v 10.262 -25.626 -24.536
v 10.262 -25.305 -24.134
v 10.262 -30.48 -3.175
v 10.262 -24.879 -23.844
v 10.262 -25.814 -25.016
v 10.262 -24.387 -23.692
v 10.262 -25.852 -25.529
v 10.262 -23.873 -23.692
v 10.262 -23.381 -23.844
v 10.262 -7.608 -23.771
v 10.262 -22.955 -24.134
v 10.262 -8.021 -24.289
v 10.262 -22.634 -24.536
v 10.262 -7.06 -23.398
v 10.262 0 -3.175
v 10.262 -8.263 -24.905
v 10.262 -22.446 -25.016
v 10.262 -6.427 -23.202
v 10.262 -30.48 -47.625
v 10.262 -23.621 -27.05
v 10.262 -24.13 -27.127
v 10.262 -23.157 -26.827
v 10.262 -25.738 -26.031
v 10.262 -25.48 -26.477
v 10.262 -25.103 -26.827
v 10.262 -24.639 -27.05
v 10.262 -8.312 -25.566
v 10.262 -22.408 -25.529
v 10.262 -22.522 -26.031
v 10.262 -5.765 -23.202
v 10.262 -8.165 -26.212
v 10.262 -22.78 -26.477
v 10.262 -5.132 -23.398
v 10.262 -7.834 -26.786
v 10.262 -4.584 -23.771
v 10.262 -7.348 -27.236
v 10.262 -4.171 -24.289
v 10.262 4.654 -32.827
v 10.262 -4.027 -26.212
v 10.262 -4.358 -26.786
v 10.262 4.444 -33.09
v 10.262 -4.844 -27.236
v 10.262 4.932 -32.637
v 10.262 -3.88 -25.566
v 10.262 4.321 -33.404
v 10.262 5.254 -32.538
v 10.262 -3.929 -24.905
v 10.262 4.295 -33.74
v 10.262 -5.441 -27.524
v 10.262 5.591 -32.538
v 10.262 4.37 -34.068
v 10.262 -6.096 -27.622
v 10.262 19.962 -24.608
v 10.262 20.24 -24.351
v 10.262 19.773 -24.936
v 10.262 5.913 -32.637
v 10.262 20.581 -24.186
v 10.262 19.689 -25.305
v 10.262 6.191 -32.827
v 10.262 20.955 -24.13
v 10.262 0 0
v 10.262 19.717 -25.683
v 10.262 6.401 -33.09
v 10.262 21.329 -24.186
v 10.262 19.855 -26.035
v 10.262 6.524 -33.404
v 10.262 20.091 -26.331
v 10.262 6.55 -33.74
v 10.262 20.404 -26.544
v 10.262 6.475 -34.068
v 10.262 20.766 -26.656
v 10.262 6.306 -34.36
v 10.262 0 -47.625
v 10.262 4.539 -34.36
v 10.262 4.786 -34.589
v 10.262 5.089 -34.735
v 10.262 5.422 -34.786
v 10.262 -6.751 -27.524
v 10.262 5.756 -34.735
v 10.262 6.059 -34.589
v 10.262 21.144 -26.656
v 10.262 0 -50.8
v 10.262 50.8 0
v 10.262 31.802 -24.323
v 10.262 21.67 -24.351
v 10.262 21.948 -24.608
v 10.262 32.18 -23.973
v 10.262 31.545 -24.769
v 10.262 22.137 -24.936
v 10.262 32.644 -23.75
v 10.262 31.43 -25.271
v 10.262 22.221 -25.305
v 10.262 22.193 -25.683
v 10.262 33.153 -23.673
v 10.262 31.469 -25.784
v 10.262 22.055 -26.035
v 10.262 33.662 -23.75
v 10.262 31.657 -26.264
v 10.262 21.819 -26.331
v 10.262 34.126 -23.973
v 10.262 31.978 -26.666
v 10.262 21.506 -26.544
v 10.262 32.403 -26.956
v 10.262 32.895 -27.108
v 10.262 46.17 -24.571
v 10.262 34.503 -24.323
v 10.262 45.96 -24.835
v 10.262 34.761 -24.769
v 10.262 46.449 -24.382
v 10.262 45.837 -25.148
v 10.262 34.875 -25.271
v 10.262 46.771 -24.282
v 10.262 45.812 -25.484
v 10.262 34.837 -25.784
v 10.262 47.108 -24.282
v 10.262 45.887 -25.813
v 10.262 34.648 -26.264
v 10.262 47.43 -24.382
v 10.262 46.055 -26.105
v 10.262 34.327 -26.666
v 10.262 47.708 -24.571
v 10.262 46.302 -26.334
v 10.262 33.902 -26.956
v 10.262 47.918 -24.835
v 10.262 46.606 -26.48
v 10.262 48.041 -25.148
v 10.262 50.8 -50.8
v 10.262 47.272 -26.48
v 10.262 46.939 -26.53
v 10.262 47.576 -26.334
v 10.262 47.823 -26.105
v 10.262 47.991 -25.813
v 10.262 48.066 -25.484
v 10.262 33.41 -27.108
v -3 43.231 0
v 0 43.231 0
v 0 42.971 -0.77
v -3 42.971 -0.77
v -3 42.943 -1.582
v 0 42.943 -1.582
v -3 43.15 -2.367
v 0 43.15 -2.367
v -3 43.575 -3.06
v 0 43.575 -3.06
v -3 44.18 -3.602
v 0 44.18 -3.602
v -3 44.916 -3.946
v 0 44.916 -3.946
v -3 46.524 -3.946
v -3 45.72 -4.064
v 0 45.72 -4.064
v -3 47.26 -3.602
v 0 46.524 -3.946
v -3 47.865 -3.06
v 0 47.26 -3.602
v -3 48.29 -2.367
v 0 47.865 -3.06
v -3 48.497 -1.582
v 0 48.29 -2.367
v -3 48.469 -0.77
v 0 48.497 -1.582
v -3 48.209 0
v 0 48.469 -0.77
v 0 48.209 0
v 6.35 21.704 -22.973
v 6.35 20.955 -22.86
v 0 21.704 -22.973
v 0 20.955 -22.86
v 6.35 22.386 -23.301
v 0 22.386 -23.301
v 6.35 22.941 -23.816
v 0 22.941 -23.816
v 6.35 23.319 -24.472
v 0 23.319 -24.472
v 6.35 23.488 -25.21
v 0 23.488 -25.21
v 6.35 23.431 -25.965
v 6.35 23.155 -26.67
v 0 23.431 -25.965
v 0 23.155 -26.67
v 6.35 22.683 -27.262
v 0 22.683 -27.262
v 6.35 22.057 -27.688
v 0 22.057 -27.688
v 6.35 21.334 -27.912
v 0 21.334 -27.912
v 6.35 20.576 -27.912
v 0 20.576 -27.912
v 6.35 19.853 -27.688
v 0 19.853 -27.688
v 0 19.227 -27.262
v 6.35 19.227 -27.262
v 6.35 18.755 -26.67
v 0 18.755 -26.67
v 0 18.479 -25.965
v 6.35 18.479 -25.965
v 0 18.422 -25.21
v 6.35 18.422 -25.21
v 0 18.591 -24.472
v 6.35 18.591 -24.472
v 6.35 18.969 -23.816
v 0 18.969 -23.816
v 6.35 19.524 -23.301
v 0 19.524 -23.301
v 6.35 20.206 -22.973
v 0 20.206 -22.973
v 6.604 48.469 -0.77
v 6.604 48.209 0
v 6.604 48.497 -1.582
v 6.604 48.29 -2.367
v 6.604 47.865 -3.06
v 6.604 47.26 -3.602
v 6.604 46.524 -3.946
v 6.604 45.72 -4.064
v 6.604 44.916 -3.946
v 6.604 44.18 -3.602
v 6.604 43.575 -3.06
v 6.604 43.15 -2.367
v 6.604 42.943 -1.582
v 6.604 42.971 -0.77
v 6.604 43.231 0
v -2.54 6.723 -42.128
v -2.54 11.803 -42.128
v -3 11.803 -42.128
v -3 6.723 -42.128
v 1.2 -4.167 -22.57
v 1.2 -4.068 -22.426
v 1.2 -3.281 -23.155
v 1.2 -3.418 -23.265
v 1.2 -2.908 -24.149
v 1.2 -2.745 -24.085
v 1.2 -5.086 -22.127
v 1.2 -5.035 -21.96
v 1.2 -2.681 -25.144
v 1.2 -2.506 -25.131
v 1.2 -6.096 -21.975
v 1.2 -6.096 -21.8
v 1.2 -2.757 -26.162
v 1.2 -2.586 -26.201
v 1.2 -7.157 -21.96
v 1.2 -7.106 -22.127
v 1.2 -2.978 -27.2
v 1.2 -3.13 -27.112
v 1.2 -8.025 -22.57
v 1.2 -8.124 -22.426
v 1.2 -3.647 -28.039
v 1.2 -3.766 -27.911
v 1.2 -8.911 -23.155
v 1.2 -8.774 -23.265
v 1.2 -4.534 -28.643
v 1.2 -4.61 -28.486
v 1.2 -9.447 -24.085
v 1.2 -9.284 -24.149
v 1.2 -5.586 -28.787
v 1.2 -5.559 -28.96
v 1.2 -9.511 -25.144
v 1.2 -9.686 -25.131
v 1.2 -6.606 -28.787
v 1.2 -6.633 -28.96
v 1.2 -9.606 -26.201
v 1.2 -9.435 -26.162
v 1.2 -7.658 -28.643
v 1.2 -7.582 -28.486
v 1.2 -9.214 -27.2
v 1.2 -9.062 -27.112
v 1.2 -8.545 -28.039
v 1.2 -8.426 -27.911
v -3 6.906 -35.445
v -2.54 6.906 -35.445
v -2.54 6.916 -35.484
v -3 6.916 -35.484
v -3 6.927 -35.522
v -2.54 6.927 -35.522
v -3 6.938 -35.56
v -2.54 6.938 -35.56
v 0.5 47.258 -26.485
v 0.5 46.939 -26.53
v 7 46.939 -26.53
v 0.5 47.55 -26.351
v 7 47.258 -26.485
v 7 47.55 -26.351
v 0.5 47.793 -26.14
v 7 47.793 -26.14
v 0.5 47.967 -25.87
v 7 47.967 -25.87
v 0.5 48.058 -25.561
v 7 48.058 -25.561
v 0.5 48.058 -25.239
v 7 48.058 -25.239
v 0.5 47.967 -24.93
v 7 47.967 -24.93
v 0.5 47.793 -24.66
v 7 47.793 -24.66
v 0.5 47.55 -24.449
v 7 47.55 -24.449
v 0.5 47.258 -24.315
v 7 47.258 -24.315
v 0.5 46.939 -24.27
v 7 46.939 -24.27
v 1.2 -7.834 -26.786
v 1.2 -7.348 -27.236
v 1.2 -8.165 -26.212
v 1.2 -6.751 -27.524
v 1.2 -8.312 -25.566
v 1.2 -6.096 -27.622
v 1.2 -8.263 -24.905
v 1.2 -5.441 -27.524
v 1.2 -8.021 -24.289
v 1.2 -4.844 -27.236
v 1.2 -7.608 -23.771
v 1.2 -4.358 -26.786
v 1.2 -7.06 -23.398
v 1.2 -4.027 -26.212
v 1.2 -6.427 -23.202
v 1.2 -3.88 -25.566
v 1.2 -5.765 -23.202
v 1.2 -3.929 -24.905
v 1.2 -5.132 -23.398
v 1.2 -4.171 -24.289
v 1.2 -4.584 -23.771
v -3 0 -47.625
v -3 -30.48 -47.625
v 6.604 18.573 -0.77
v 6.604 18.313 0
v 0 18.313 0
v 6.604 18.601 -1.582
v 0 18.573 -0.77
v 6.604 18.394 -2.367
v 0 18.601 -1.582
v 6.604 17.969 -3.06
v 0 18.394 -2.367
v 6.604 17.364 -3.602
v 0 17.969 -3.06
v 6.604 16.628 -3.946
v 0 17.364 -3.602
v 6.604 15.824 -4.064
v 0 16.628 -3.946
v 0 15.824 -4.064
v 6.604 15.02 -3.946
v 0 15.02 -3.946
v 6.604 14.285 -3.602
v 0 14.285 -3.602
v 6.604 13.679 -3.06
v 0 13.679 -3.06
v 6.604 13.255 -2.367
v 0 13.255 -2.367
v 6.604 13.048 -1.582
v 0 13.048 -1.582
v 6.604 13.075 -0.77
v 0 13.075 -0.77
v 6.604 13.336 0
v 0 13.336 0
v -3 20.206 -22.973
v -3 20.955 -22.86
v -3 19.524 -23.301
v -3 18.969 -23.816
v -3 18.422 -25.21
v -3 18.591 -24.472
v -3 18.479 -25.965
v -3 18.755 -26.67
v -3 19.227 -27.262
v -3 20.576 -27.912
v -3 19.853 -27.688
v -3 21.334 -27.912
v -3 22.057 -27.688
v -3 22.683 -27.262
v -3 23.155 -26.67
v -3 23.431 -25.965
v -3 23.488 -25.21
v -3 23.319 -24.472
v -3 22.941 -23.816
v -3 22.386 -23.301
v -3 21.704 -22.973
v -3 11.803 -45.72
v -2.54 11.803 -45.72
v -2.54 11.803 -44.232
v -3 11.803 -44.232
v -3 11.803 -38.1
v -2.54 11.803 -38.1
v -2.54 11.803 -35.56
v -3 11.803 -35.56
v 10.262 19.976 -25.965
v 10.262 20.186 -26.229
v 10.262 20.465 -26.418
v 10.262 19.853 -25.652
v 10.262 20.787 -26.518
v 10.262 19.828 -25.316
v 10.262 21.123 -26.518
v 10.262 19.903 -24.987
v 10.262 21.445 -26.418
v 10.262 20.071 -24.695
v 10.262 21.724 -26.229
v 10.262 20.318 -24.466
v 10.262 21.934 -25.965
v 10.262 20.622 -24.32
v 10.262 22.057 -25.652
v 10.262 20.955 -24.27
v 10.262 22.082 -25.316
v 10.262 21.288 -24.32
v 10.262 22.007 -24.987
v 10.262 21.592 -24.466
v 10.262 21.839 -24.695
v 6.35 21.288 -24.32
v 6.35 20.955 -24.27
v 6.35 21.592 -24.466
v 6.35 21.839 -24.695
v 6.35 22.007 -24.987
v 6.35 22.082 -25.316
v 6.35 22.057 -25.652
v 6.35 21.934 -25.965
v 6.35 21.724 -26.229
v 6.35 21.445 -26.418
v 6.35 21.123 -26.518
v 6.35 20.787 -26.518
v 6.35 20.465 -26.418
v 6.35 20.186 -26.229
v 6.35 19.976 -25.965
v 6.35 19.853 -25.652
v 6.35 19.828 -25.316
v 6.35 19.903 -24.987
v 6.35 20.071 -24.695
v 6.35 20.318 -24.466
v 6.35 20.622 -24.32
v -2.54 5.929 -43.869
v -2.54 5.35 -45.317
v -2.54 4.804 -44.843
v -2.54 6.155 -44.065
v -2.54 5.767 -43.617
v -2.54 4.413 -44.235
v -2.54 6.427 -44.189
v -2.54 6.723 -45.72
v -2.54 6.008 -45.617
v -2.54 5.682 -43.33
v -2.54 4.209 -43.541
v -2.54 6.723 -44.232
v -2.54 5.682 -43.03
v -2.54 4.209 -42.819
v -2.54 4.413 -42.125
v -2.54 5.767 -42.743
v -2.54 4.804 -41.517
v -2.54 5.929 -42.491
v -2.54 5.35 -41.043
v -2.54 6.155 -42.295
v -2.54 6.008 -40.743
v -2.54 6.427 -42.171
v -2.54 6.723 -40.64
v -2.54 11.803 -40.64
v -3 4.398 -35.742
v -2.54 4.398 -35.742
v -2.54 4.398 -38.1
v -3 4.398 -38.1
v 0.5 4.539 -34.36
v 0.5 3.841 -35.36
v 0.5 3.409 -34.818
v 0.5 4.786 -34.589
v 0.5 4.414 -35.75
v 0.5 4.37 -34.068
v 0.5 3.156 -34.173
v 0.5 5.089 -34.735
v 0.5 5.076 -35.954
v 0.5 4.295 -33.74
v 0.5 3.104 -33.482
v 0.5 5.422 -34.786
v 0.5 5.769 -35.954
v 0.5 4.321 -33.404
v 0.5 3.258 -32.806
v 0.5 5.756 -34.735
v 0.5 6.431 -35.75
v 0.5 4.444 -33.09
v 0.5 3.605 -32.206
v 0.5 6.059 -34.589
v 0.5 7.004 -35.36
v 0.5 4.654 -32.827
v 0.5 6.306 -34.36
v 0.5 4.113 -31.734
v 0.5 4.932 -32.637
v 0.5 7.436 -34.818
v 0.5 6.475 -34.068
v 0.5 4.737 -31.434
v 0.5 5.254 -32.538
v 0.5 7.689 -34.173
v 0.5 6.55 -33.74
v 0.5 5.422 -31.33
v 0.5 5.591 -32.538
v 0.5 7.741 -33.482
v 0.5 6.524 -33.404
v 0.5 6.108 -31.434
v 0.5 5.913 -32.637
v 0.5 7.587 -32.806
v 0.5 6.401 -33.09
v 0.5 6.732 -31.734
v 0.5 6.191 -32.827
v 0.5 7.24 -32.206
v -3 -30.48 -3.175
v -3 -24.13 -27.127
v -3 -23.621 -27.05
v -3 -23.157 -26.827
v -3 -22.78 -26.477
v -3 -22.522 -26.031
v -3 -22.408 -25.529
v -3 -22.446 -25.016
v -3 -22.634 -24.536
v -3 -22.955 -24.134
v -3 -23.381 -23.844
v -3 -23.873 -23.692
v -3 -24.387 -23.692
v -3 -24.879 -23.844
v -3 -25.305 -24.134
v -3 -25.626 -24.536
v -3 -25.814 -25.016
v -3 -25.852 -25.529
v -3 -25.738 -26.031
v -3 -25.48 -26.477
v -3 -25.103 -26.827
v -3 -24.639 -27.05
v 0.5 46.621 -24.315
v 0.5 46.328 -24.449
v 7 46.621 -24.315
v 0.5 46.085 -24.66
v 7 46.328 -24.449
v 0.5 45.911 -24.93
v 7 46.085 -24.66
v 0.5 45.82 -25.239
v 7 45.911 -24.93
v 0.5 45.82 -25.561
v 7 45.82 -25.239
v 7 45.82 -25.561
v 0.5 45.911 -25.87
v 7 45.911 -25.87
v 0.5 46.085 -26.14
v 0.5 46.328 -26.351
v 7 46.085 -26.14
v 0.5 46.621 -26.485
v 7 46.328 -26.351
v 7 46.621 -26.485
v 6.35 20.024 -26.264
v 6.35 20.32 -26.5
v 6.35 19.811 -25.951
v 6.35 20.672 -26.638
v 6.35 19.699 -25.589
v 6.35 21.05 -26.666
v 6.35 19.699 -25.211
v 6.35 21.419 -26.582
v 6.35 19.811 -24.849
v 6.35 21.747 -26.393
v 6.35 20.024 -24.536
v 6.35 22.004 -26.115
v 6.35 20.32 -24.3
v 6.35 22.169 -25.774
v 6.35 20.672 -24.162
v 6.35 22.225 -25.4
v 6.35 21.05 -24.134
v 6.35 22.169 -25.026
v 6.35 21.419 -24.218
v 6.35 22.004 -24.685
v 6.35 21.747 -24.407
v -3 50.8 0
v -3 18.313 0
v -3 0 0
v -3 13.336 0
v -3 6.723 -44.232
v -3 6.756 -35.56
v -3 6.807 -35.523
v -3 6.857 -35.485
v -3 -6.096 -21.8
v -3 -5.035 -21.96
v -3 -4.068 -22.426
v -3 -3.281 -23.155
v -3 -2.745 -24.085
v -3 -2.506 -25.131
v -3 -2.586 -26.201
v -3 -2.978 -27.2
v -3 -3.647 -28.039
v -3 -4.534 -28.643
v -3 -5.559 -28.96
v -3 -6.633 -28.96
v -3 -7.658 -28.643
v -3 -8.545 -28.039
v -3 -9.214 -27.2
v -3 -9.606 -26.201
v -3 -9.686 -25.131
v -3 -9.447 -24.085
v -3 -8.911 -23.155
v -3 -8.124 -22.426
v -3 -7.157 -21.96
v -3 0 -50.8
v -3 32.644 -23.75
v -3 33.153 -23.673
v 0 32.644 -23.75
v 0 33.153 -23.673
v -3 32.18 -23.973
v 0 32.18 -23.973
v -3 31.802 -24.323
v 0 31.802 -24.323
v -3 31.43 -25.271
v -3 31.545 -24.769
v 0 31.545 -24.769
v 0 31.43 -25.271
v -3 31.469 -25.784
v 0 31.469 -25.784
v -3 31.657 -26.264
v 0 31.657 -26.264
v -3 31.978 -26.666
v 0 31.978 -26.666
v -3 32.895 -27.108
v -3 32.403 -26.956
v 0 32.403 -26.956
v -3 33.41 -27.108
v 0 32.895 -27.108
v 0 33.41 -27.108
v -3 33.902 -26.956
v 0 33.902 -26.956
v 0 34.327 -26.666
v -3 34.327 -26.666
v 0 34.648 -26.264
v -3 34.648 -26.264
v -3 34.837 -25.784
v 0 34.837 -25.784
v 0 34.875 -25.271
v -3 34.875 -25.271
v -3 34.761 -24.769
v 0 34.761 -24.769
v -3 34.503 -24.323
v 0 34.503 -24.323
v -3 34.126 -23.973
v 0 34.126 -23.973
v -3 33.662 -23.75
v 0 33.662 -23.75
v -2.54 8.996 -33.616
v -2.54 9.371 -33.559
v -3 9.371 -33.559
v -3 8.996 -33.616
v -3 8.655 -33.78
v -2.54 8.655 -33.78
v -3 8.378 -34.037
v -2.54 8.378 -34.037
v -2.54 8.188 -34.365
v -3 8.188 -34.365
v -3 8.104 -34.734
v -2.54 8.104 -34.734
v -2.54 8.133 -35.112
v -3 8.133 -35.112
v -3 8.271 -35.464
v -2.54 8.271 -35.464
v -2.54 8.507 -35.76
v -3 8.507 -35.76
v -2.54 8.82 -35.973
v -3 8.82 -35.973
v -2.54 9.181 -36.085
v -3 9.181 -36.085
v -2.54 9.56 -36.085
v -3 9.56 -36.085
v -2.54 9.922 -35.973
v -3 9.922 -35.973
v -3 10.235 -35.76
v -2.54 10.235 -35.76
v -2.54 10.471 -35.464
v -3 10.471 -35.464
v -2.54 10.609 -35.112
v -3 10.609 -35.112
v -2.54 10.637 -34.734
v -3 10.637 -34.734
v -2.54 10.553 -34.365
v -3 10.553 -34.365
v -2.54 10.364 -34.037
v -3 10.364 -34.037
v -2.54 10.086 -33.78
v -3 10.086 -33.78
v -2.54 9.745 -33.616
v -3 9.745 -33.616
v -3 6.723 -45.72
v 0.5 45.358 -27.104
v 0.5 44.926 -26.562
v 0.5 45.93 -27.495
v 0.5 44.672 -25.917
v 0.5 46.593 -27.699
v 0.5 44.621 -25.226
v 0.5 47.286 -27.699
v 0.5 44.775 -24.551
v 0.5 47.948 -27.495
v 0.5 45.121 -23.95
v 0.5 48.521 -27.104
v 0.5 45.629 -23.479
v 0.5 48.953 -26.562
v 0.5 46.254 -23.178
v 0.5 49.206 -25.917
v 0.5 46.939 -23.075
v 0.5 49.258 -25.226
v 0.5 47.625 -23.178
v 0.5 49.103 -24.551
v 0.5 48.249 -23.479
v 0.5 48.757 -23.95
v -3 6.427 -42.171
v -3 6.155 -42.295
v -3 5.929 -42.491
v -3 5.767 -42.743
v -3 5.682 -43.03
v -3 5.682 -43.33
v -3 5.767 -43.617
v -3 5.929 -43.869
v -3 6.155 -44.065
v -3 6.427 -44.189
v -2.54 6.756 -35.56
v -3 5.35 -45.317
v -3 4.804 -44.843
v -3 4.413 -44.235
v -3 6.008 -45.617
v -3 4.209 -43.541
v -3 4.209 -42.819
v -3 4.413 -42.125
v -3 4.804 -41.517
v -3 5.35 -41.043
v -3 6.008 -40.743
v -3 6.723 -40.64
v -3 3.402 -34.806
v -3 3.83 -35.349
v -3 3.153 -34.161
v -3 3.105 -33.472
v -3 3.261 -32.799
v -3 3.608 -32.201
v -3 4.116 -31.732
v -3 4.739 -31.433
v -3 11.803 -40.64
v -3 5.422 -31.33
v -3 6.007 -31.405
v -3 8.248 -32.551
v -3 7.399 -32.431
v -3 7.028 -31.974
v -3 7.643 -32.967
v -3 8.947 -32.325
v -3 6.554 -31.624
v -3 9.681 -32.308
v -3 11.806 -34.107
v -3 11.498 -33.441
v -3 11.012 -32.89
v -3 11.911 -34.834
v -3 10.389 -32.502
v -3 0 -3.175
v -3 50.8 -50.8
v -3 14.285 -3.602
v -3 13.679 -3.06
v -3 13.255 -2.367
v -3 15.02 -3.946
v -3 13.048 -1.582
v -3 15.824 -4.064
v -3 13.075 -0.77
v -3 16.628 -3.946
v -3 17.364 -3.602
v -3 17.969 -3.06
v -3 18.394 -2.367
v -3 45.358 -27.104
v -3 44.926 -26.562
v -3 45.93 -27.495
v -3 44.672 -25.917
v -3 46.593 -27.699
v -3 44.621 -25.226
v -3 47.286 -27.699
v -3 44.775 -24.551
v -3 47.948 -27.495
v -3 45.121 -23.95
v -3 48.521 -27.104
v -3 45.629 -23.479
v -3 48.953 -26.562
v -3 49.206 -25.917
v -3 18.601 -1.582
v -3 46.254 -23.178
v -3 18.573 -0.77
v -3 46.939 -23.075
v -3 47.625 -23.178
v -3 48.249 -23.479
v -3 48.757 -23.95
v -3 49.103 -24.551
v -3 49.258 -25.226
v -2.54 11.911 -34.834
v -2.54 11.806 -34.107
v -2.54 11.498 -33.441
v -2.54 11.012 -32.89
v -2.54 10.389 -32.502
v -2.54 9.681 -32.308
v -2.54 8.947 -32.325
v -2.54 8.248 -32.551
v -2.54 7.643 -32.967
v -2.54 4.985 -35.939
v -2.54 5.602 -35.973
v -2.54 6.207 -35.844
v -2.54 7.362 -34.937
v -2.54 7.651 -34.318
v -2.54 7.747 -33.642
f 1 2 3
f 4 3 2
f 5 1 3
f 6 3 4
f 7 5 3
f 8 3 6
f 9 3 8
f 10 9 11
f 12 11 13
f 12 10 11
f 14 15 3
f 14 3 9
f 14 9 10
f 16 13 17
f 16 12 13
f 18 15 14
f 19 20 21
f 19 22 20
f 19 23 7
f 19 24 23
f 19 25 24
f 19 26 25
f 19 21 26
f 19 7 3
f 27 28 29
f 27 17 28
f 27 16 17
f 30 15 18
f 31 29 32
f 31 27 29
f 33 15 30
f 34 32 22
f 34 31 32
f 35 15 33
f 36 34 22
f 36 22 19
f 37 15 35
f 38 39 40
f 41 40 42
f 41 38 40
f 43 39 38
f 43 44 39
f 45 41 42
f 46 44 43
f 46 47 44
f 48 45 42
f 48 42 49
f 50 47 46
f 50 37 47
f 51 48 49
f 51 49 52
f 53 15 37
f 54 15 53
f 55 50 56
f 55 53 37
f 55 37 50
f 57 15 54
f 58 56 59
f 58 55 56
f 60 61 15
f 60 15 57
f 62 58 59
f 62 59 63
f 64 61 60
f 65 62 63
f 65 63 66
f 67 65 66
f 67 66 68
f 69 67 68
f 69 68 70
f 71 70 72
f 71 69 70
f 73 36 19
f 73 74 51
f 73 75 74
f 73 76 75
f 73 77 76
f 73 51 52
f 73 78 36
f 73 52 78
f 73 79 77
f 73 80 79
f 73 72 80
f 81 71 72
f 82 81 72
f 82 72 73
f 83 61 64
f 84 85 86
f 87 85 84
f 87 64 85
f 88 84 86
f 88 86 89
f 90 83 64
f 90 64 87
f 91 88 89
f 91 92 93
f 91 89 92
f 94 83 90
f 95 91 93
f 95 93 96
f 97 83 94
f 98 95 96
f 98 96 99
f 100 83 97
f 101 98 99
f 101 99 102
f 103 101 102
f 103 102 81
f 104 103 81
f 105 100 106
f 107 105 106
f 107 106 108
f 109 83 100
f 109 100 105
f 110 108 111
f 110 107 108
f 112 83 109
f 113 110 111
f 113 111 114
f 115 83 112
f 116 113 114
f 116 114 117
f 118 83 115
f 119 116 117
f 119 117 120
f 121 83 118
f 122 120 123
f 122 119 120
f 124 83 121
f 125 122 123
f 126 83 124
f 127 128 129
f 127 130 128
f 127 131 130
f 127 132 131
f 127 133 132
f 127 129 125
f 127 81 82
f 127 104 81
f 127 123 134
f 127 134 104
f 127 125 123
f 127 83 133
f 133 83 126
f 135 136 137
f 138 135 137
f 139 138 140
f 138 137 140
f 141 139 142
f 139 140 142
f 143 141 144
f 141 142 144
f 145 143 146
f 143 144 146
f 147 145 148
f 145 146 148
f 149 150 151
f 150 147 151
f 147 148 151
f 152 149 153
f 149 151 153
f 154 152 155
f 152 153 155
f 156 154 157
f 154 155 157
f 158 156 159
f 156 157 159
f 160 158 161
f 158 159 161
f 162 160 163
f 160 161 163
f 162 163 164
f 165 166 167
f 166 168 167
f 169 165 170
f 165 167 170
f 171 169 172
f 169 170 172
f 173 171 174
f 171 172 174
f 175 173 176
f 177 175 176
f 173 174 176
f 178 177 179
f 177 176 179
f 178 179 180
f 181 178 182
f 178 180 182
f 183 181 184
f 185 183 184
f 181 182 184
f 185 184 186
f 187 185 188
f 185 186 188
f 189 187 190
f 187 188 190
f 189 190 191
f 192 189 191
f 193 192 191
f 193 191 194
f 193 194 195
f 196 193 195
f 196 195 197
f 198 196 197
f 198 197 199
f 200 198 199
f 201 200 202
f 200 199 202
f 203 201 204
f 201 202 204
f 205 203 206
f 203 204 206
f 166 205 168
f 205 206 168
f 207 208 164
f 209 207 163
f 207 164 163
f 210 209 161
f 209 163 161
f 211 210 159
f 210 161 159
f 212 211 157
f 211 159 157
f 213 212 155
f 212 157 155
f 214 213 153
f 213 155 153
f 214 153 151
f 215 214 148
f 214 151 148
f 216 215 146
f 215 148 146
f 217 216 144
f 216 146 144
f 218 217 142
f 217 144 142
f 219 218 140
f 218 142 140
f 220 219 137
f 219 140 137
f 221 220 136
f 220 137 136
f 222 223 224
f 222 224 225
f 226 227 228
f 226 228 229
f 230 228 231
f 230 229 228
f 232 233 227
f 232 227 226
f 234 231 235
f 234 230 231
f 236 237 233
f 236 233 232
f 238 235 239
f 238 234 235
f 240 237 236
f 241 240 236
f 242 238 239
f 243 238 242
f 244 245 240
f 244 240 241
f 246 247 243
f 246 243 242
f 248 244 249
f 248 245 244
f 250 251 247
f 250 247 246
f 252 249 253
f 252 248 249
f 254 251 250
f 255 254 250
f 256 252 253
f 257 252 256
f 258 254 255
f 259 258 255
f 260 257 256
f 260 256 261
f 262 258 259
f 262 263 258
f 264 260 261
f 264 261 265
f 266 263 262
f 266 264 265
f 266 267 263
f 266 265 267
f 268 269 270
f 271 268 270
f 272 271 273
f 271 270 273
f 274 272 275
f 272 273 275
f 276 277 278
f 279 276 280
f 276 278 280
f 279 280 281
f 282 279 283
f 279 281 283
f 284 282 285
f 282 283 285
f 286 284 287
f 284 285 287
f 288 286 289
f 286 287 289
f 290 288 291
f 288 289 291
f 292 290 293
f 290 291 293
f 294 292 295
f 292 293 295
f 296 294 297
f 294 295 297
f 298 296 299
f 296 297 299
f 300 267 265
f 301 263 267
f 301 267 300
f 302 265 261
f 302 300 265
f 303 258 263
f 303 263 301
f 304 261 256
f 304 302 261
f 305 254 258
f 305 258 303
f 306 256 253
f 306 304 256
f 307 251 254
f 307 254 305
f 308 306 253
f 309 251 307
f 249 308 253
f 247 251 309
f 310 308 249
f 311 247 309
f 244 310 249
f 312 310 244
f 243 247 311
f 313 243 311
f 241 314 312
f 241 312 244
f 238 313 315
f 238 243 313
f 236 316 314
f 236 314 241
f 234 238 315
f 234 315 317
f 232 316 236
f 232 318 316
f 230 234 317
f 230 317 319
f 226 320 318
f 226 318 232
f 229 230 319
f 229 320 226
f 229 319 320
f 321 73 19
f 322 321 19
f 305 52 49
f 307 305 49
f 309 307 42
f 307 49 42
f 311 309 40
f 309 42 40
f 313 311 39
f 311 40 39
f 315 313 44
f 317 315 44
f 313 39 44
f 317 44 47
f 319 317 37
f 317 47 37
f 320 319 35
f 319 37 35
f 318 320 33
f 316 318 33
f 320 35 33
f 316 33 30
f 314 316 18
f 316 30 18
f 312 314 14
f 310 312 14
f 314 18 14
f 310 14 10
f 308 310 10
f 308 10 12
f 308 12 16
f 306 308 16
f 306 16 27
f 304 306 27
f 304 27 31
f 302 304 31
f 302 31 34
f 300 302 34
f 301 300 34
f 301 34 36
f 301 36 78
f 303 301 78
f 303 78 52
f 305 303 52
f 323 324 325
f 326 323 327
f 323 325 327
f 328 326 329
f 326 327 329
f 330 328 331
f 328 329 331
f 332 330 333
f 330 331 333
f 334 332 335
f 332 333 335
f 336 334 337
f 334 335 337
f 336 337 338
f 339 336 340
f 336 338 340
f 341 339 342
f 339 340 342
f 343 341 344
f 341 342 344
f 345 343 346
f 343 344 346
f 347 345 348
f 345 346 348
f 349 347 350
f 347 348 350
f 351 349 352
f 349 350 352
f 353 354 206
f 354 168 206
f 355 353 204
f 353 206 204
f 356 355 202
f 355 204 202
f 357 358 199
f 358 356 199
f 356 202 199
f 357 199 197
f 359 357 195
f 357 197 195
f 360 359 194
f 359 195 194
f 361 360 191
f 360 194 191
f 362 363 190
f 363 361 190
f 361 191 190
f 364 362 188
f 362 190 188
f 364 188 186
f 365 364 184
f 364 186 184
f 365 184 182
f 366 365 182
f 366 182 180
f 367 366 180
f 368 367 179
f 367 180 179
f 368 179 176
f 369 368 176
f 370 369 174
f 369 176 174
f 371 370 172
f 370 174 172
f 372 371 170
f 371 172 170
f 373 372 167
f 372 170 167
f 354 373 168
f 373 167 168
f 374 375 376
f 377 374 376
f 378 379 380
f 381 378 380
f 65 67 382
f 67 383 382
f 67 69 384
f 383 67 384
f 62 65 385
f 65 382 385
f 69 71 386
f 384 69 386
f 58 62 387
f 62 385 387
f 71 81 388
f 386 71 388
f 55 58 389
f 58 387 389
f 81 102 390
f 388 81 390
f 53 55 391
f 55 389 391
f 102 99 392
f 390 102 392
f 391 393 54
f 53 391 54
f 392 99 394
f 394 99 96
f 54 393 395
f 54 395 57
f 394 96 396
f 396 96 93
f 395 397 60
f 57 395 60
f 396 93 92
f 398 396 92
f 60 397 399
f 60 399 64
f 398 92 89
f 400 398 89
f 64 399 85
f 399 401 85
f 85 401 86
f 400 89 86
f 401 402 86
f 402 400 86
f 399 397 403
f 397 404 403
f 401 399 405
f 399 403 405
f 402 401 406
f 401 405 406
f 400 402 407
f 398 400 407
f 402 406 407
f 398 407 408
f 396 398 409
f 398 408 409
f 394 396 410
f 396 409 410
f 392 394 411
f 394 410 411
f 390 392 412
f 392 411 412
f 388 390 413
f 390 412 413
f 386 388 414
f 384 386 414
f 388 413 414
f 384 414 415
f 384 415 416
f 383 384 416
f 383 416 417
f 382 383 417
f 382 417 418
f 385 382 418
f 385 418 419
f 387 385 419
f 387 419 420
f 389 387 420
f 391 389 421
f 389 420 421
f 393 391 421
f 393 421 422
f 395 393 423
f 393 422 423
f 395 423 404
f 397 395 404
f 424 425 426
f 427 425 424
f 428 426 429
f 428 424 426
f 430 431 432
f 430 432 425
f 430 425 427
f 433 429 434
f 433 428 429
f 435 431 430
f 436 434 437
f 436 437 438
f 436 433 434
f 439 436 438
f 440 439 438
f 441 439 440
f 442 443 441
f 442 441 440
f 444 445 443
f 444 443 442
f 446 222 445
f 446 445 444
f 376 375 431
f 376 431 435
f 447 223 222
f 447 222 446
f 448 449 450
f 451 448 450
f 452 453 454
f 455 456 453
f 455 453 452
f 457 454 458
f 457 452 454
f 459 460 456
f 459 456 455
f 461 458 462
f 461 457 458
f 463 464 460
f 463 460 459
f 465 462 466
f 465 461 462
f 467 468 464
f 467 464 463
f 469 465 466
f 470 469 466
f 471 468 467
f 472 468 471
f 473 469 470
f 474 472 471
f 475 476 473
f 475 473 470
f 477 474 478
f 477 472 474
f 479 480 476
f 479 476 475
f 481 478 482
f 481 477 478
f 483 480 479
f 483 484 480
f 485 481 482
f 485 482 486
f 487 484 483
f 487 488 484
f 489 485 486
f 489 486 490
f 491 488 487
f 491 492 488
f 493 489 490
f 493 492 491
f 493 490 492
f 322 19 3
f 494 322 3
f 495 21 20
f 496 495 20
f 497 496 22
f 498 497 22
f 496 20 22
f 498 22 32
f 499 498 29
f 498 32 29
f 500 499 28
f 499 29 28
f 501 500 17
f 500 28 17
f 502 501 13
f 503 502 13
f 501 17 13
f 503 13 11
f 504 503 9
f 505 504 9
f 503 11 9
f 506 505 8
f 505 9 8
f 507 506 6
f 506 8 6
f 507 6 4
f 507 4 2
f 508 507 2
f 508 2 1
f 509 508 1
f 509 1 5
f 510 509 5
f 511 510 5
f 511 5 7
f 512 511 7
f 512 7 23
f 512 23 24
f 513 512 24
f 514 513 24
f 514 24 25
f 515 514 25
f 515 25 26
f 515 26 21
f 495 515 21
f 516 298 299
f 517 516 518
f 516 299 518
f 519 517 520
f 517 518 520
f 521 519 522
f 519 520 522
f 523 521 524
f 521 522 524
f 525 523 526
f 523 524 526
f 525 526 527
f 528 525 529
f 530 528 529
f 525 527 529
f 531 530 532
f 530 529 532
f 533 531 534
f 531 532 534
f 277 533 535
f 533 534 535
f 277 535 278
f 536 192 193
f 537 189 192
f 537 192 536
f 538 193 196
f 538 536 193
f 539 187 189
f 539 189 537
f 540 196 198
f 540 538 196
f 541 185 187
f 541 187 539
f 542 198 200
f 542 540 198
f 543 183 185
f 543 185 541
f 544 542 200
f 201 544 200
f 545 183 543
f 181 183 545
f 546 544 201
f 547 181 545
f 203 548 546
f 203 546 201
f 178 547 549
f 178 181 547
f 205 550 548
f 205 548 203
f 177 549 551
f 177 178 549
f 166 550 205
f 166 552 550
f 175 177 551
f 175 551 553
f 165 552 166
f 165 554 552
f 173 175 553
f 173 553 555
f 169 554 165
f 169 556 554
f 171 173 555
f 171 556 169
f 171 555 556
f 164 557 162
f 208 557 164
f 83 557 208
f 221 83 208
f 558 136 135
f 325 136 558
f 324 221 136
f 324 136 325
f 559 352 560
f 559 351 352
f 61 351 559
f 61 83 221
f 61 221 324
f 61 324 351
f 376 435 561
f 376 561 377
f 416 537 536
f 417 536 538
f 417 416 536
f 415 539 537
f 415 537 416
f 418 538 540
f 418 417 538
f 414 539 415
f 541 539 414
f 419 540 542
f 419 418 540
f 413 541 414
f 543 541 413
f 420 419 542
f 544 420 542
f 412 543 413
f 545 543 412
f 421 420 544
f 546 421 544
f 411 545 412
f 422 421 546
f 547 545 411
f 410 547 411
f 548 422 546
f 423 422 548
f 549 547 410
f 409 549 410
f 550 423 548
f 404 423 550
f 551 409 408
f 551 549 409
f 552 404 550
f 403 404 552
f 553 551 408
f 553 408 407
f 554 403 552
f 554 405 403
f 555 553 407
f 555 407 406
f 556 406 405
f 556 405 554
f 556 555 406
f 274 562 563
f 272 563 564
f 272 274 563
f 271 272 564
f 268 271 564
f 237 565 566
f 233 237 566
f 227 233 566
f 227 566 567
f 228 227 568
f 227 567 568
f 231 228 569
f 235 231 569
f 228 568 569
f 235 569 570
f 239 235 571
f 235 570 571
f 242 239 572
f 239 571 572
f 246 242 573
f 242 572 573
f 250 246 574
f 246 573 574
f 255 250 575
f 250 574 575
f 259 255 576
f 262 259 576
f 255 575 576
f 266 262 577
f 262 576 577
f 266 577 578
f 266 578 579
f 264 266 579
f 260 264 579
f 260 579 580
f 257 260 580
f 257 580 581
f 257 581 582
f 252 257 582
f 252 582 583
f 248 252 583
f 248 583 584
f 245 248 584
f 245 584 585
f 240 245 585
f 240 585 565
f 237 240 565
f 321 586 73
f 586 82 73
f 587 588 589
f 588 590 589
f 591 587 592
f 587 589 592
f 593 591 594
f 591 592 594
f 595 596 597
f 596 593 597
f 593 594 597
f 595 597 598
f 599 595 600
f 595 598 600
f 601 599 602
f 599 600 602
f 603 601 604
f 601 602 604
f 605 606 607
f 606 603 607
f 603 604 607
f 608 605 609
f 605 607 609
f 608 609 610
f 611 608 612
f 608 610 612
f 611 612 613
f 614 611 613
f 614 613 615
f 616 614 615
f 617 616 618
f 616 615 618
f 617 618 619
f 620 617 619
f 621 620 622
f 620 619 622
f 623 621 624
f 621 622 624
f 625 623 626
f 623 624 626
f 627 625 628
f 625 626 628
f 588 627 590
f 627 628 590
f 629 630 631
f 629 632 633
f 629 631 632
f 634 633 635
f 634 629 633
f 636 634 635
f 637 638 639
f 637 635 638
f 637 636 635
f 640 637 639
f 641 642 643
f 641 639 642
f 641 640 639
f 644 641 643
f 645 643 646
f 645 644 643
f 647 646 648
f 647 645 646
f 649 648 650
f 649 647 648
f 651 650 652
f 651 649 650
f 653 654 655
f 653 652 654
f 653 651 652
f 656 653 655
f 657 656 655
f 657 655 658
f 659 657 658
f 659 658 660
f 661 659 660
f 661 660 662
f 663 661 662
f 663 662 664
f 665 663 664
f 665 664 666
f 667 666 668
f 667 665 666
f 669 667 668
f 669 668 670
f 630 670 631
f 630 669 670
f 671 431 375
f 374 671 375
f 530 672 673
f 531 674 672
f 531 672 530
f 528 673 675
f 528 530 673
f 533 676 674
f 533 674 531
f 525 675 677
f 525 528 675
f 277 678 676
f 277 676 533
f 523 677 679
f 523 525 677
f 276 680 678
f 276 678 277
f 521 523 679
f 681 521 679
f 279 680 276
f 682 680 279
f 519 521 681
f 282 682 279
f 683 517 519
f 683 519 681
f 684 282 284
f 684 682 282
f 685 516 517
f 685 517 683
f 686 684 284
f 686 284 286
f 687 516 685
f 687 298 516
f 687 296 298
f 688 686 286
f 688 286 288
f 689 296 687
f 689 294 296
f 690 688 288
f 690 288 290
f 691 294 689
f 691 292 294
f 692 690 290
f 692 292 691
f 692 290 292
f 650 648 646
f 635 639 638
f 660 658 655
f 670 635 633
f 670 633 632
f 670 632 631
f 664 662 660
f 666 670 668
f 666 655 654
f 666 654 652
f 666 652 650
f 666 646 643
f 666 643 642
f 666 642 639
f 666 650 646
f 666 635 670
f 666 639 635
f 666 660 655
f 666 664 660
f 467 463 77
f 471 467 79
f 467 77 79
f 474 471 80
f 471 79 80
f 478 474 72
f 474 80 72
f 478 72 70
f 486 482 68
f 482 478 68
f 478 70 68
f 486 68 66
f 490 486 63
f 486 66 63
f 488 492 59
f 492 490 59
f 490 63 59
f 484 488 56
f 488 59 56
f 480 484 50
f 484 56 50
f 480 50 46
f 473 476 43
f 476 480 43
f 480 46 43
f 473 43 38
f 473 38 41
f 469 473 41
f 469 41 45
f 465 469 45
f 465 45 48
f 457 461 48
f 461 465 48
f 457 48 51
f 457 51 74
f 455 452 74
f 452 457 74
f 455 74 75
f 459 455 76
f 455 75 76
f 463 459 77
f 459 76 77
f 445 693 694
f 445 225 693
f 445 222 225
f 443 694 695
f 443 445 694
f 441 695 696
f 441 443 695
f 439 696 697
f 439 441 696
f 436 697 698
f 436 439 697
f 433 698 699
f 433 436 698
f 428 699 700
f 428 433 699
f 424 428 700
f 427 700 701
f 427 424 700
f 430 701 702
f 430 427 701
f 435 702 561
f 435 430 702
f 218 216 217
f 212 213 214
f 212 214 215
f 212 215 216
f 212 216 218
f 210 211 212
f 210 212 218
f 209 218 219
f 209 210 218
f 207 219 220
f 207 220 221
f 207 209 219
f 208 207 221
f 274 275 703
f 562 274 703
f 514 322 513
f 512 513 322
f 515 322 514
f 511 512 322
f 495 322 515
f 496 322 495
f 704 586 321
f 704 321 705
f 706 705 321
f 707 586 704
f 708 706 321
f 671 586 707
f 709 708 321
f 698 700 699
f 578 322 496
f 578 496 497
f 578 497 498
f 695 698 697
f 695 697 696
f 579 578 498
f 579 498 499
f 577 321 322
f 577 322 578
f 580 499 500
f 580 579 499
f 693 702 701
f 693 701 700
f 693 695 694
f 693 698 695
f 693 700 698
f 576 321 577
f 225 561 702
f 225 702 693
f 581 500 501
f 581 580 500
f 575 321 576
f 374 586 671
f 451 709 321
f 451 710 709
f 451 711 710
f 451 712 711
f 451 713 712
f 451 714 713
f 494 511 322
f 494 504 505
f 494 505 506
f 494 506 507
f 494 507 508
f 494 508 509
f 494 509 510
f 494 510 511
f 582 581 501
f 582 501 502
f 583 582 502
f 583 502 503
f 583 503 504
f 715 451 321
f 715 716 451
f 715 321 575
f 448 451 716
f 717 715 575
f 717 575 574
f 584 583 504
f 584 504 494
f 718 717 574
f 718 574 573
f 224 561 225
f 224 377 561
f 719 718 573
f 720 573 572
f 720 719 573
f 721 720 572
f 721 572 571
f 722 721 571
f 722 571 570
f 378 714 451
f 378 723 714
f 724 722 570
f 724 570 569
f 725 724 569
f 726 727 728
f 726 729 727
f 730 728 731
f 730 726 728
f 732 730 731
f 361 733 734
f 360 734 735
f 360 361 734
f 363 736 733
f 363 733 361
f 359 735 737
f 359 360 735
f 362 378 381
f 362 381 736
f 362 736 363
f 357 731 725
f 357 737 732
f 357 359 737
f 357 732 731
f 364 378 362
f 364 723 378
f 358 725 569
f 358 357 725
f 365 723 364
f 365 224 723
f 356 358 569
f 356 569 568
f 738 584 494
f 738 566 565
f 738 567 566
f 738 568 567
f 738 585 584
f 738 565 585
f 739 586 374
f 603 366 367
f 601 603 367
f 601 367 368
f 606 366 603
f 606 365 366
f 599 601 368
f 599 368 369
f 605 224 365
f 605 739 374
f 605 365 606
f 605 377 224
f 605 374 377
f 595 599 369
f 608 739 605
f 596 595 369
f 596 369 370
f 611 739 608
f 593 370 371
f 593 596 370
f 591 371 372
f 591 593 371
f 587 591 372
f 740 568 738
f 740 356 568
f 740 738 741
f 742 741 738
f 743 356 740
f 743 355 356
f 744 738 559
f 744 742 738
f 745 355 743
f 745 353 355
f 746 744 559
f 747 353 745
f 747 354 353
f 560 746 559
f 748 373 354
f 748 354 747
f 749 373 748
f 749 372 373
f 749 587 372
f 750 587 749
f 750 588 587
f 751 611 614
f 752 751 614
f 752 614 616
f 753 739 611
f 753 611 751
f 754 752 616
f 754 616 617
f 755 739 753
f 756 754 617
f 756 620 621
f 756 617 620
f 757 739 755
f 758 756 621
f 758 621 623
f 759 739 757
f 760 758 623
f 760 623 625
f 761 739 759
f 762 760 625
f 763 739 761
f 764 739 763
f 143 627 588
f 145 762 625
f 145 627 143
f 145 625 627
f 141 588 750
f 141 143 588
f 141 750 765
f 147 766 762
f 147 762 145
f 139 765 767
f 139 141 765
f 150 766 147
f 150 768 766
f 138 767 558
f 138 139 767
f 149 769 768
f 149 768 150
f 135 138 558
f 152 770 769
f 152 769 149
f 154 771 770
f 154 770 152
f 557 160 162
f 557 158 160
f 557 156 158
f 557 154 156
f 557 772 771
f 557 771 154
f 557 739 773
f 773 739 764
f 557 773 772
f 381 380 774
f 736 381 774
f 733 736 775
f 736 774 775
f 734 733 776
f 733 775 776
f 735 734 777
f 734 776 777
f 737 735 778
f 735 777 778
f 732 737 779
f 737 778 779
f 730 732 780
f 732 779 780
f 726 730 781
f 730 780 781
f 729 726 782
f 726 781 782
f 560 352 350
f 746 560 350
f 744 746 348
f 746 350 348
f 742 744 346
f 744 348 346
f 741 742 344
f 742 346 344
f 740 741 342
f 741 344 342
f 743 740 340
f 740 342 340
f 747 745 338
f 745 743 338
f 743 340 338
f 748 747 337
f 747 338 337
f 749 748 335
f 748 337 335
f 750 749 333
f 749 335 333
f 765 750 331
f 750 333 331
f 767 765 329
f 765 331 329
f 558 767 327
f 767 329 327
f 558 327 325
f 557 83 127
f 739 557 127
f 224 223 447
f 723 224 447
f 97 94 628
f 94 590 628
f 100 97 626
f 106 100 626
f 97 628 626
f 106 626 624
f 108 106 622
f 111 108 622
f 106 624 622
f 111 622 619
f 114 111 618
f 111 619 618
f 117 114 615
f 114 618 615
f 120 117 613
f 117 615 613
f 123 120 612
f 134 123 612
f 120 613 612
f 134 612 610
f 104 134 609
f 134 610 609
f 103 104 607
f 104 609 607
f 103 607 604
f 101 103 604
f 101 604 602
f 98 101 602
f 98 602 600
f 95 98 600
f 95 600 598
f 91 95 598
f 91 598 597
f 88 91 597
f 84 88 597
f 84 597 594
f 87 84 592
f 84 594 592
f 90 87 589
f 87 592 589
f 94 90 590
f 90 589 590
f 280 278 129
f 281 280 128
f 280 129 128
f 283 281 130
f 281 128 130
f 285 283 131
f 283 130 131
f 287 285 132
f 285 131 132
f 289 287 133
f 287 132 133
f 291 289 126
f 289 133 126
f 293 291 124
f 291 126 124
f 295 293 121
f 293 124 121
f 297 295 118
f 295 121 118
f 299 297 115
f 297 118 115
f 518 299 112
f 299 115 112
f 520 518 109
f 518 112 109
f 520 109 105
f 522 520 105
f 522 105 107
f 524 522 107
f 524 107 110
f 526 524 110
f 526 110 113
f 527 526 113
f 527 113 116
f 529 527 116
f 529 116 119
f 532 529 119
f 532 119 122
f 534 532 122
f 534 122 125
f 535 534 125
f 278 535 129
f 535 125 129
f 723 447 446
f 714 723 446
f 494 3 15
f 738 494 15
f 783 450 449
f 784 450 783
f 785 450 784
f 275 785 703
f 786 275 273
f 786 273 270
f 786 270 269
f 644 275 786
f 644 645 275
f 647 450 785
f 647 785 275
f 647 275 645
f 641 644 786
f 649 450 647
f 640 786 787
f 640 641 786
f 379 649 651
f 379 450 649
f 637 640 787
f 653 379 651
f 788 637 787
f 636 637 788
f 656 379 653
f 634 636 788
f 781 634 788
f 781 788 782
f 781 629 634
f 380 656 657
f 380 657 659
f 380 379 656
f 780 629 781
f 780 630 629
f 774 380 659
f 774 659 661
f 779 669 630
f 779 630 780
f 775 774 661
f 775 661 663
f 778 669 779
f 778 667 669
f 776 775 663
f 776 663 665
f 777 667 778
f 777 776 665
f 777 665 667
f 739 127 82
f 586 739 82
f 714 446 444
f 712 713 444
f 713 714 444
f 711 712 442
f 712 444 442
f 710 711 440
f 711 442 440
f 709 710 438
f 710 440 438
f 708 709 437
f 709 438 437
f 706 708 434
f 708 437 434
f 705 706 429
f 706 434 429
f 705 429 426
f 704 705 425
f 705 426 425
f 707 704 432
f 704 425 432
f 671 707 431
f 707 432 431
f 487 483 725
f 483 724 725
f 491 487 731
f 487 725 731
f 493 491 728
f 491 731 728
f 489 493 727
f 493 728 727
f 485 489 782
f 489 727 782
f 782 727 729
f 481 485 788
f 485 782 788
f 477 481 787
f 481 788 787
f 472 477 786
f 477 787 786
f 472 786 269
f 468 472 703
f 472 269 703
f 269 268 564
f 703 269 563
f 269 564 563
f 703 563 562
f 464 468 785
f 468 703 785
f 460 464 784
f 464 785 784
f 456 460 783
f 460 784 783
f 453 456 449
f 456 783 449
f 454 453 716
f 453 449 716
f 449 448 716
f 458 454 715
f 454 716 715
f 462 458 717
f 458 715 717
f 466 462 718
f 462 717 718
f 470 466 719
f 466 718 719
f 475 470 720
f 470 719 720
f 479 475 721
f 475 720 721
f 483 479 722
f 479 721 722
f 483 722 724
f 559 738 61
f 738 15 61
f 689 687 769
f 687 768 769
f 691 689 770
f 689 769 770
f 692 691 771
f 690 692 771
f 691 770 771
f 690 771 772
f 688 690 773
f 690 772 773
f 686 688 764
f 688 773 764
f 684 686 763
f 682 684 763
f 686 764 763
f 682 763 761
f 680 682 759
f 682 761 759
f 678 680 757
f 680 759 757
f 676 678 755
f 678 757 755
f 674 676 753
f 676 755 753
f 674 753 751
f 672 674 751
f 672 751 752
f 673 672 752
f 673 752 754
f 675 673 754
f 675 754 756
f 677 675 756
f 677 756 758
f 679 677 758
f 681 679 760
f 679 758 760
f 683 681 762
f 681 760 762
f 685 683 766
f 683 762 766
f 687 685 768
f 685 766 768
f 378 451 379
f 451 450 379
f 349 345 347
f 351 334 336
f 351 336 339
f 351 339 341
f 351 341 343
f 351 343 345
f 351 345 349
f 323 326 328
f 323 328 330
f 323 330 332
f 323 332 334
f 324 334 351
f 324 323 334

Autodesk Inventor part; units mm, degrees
ref_plane "YZ Plane" through (0, 0, 0) normal (1, 0, 0) x (0, 1, 0)
ref_plane "XZ Plane" through (0, 0, 0) normal (0, 1, 0) x (-1, 0, 0)
ref_plane "XY Plane" through (0, 0, 0) normal (0, 0, 1) x (1, 0, 0)
sketch "Sketch1" plane through (0, 0, 0) normal (1, 0, 0) x (0, 1, 0)
  line L0 (0, 0) -> (50.8, 0)
  line L1 (50.8, 0) -> (50.8, -50.8)
  line L2 (50.8, -50.8) -> (0, -50.8)
  line L3 (0, -50.8) -> (0, 0)
  circle A0 centre (46.9392, -25.4) radius 0.889
  circle A1 centre (20.955, -25.4) radius 1.27
  line L4 (20.955, -25.4) -> (20.955, -50.8) construction
  line L5 (46.9392, -25.4) -> (46.9392, -50.8) construction
  line L6 (20.955, -25.4) -> (50.8, -25.4) construction
  line L7 (46.9392, -25.4) -> (50.8, -25.4) construction
  dimension "d0" = 50.8
  dimension "d2" = 50.8
  dimension "d3" = 25.4
  dimension "d4" = 25.4
  dimension "d5" = 29.845
  dimension "d6" = 3.8608
  dimension "d7" = 2.54
  dimension "d8" = 1.778
extrude "Extrusion1" add sketch "Sketch1" along normal blind 12.7
sketch "Sketch2" plane through (0, 0, -50.8) normal (0, -1, 0) x (1, 0, 0)
  line L0 (0, 0) -> (12.7, 0)
  line L1 (0, 50.8) -> (12.7, 50.8)
  line L2 (6.35, 50.8) -> (6.35, 40.4) construction
  line L3 (6.35, 0) -> (6.35, 10.4) construction
  circle A0 centre (6.35, 10.4) radius 3.175
  circle A1 centre (6.35, 40.4) radius 3.175
  line L4 (12.7, 50.8) -> (12.7, 0)
  line L5 (6.35, 40.4) -> (6.35, 10.4) construction
  dimension "d14" = 6.35
  dimension "d15" = 6.35
  dimension "d77" = 30
extrude "Extrusion2" [suppressed]
sketch "Sketch4" plane through (0, 0, 0) normal (-1, 0, 0) x (0, 0, 1)
  line L0 (0, 0) -> (0, 50.8)
  line L1 (0, 50.8) -> (0, 45.72) construction
  line L2 (0, 45.72) -> (-1.27, 45.72) construction
  circle A0 centre (-1.27, 45.72) radius 2.794
  line L3 (-1.27, 45.72) -> (-1.27, 15.8242) construction
  circle A1 centre (-1.27, 15.8242) radius 2.794
  dimension "d23" = 5.08
  dimension "d24" = 1.27
  dimension "d25" = 5.588
  dimension "d26" = 29.8958
  dimension "d27" = 5.588
extrude "Extrusion4" cut sketch "Sketch4" against normal blind 6.604
sketch "Sketch5" plane through (0, 0, 0) normal (-1, 0, 0) x (0, 0, 1)
  line L0 (0, 48.2087) -> (0, 50.8)
  line L1 (0, 50.8) -> (-50.8, 50.8)
  line L2 (0, 18.3129) -> (0, 43.2313)
  line L3 (-50.8, -12.7) -> (0, -12.7)
  line L4 (0, -12.7) -> (0, 50.8)
  line L5 (0, 50.8) -> (-50.8, 50.8)
  line L6 (-50.8, 50.8) -> (-50.8, -12.7)
  line L7 (-38.1, 4.3981) -> (-38.1, 11.8033)
  line L8 (-38.1, 4.3981) -> (-35.56, 4.3981)
  line L9 (-35.56, 4.3981) -> (-35.56, 6.9381)
  arc A0 (-35.56, 6.9381) -> (-35.56, 11.8033) centre (-34.8292, 9.3707) ccw
  line L10 (-35.56, 11.8033) -> (-38.1, 11.8033)
  line L11 (-45.72, 11.8033) -> (-45.72, 6.7233)
  line L12 (-45.72, 11.8033) -> (-40.64, 11.8033)
  line L13 (-40.64, 11.8033) -> (-40.64, 6.7233)
  circle A1 centre (-43.18, 6.7233) radius 2.54
  line L14 (-50.8, -7.7566) -> (-38.1, -7.7566) construction
  line L15 (-50.8, -3.6438) -> (-45.72, -3.6438) construction
  line L16 (-40.64, 6.7233) -> (-45.72, 6.7233) construction
  line L17 (-45.72, 11.8033) -> (-40.64, 11.8033)
  arc A2 (-40.64, 6.7233) -> (-45.72, 6.7233) centre (-43.18, 6.7233) ccw
  circle A3 centre (-25.4, 20.955) radius 1.27
  circle A4 centre (-43.18, 7.6582) radius 0.935
  line L18 (-42.245, 7.6582) -> (-42.245, 11.8033)
  line L19 (-42.245, 11.8033) -> (-44.115, 11.8033)
  line L20 (-44.115, 11.8033) -> (-44.115, 7.6582)
  line L21 (-44.115, 11.8033) -> (-42.245, 11.8033)
  circle A5 centre (-34.8292, 9.3707) radius 1.27
  line L22 (-50.8, 0) -> (0, 0)
  dimension "d46" = 12.7
  dimension "d47" = 5.08
  dimension "d48" = 5.08
  dimension "d49" = 2.54
  dimension "d50" = 2.54
  dimension "d52" = 2.54
  dimension "d53" = 5.08
  dimension "d57" = 58.5566
  dimension "d58" = 54.4438
  dimension "d59" = 35.56
  dimension "d60" = 0
  dimension "d61" = 63.5
  dimension "d62" = 0
  dimension "d64" = 38.1
  dimension "d67" = 1.8699
  dimension "d80" = 11.8033
  dimension "d81" = 4.3981
  dimension "d82" = 11.8033
extrude "Extrusion5" add sketch "Sketch5" along normal blind 2.54 contours L7 L10 A0 L9 L8 | L12 L20 A1 L11 | A1 L20 A4 L18 | L12 L18 A1 L20 | A1 L18 L12 L13 | A1 L18 A4 L20 | A4 | A5
sketch "Sketch6" plane through (-2.54, 0, 0) normal (-1, 0, 0) x (0, 0, 1)
  arc A0 (-35.56, 6.9381) -> (-35.56, 11.8033) centre (-34.8292, 9.3707) ccw
  line L0 (-35.56, 11.8033) -> (-38.1, 11.8033)
  circle A1 centre (-34.8292, 9.3707) radius 1.27
  line L1 (-35.56, 11.8033) -> (-35.56, 6.9381)
  point P0 (0, 0)
  dimension "d68" = 2.54
extrude "Extrusion6" cut sketch "Sketch6" against normal blind 2.54 contours L1 A1 | A1 L1
sketch "Sketch7" plane through (-2.54, 0, 0) normal (-1, 0, 0) x (0, 0, 1)
  arc A0 (-45.72, 6.7233) -> (-40.64, 6.7233) centre (-43.18, 6.7233) ccw
  line L0 (-40.64, 11.8033) -> (-45.72, 11.8033)
  line L1 (-44.2316, 11.8033) -> (-42.1284, 11.8033)
  line L2 (-42.1284, 11.8033) -> (-42.1284, 6.7233)
  line L3 (-42.1284, 6.7233) -> (-44.2316, 6.7233)
  line L4 (-44.2316, 6.7233) -> (-44.2316, 11.8033)
  circle A1 centre (-43.18, 6.7233) radius 1.0516
  point P0 (0, 0)
  dimension "d71" = 2.1033
extrude "Extrusion7" cut sketch "Sketch7" against normal blind 2.54
sketch "Sketch8" plane through (12.7, 0, 0) normal (1, 0, 0) x (0, 0, -1)
  circle A0 centre (25.4, 20.955) radius 1.27
  circle A1 centre (25.4, 46.9392) radius 0.889
  line L0 (0, 50.8) -> (0, 0)
  line L1 (0, 0) -> (50.8, 0)
  line L2 (0, 50.8) -> (50.8, 50.8)
  line L3 (50.8, 50.8) -> (50.8, 0)
  line L4 (50.8, 0) -> (0, 0)
  line L5 (0, 0) -> (0, 50.8)
extrude "Extrusion8" cut sketch "Sketch8" against normal blind 2.4384
sketch "Sketch9" plane through (10.2616, 0, 0) normal (1, 0, 0) x (0, 0, -1)
  circle A0 centre (25.4, 20.955) radius 1.27
  circle A1 centre (25.4, 46.9392) radius 0.889
  line L0 (0, 0) -> (0, 50.8)
  line L1 (50.8, 0) -> (0, 0)
  line L2 (50.8, 50.8) -> (50.8, 0)
  line L3 (0, 50.8) -> (50.8, 50.8)
  circle A2 centre (25.4, 46.9392) radius 0.889
sketch "Sketch12" plane through (0, 50.8, 0) normal (0, 1, 0) x (1, 0, 0)
  line L0 (10.2616, 0) -> (10.2616, 50.8)
  line L1 (10.2616, 15.875) -> (10.2616, 34.925)
  line L2 (10.2616, 34.925) -> (0, 34.925)
  line L3 (0, 34.925) -> (0, 15.875)
  line L4 (0, 15.875) -> (10.2616, 15.875)
  line L5 (10.2616, 15.875) -> (0, 34.925) construction
  line L6 (10.2616, 34.925) -> (0, 15.875) construction
  point P0 (5.1308, 25.4)
  dimension "d84" = 19.05
extrude "Extrusion9" add sketch "Sketch12" along normal blind 25.4
sketch "Sketch14" plane through (0, 0, 0) normal (-1, 0, 0) x (0, 0, 1)
  line L0 (-44.2316, 6.7233) -> (-44.2316, 11.8033)
  line L1 (-22.86, 55.5625) -> (-22.86, 71.4375)
  line L2 (-22.86, 71.4375) -> (-27.94, 71.4375)
  line L3 (-27.94, 71.4375) -> (-27.94, 55.5625)
  line L4 (-27.94, 55.5625) -> (-22.86, 55.5625)
  line L5 (-22.86, 55.5625) -> (-27.94, 71.4375) construction
  line L6 (-22.86, 71.4375) -> (-27.94, 55.5625) construction
  circle A0 centre (-25.4, 71.4375) radius 2.54
  circle A1 centre (-25.4, 55.5625) radius 2.54
  line L7 (-15.875, 50.8) -> (-15.875, 76.2)
  point P0 (-25.4, 63.5)
  dimension "d87" = 5.08
  dimension "d88" = 15.875
  dimension "d91" = 9.525
extrude "Extrusion10" cut sketch "Sketch14" against normal blind 25.4
sketch "Sketch15" plane through (0, 0, 0) normal (-1, 0, 0) x (0, 0, 1)
  circle A0 centre (-25.4, 20.955) radius 1.27
  circle A1 centre (-25.4, 20.955) radius 2.54
  dimension "d92" = 5.08
extrude "Extrusion11" cut sketch "Sketch15" against normal blind 6.35
sketch "Sketch16" plane through (10.2616, 0, 0) normal (1, 0, 0) x (0, 0, -1)
  circle A0 centre (25.4, 20.955) radius 1.27
  circle A1 centre (25.4, 46.9392) radius 0.889
  circle A2 centre (33.6553, 5.4225) radius 0.889
  dimension "d99" = 17.59
  dimension "d100" = 1.778
  dimension "d103" = 207.99
extrude "Extrusion12" cut sketch "Sketch16" against normal up to next contours A2
sketch "Sketch17" plane through (0, 0, 0) normal (-1, 0, 0) x (0, 0, 1)
  circle A0 centre (-33.6553, 5.4225) radius 0.889
  circle A1 centre (-25.4, 20.955) radius 2.54
  line L0 (-22.86, 71.4375) -> (-22.86, 55.5625)
  arc A2 (-27.94, 55.5625) -> (-22.86, 55.5625) centre (-25.4, 55.5625) ccw
  line L1 (-27.94, 55.5625) -> (-27.94, 71.4375)
  arc A3 (-22.86, 71.4375) -> (-27.94, 71.4375) centre (-25.4, 71.4375) ccw
  line L2 (-45.72, 11.8033) -> (-44.2316, 11.8033)
  line L3 (-44.2316, 6.7233) -> (-44.2316, 11.8033)
  arc A4 (-44.2316, 6.7233) -> (-42.1284, 6.7233) centre (-43.18, 6.7233) ccw
  line L4 (-42.1284, 11.8033) -> (-42.1284, 6.7233)
  line L5 (-42.1284, 11.8033) -> (-40.64, 11.8033)
  line L6 (-40.64, 11.8033) -> (-40.64, 6.7233)
  arc A5 (-45.72, 6.7233) -> (-40.64, 6.7233) centre (-43.18, 6.7233) ccw
  line L7 (-45.72, 6.7233) -> (-45.72, 11.8033)
  line L8 (-38.1, 11.8033) -> (-35.56, 11.8033)
  arc A6 (-35.56, 6.9381) -> (-35.56, 11.8033) centre (-34.8292, 9.3707) ccw
  line L9 (-35.56, 6.9381) -> (-35.56, 4.3981)
  line L10 (-35.56, 4.3981) -> (-38.1, 4.3981)
  line L11 (-38.1, 4.3981) -> (-38.1, 11.8033)
  arc A7 (0, 48.2087) -> (0, 43.2313) centre (-1.27, 45.72) ccw
  line L12 (0, 50.8) -> (-15.875, 50.8)
  line L13 (-34.925, 50.8) -> (-34.925, 76.2)
  line L14 (-34.925, 50.8) -> (-50.8, 50.8)
  line L15 (-50.8, 50.8) -> (-50.8, 0)
  line L16 (-50.8, 0) -> (0, 0)
  line L17 (0, 0) -> (0, 13.3355)
  arc A8 (0, 18.3129) -> (0, 13.3355) centre (-1.27, 15.8242) ccw
  circle A9 centre (-25.4, 46.9392) radius 0.889
  line L18 (-34.925, 50.8) -> (-34.925, 76.2)
  line L19 (-15.875, 76.2) -> (-34.925, 76.2)
  line L20 (-15.875, 76.2) -> (-15.875, 50.8)
  line L21 (-15.875, 50.8) -> (0, 50.8)
  line L22 (0, 50.8) -> (0, 48.2087)
  arc A10 (0, 48.2087) -> (0, 43.2313) centre (-1.27, 45.72) ccw
  arc A11 (0, 18.3129) -> (0, 13.3355) centre (-1.27, 15.8242) ccw
  line L23 (0, 43.2313) -> (0, 18.3129)
  line L24 (0, 13.3355) -> (0, 0)
  line L25 (0, 0) -> (-50.8, 0)
  line L26 (-50.8, 0) -> (-50.8, 50.8)
  line L27 (-50.8, 50.8) -> (-34.925, 50.8)
  circle A12 centre (-25.4, 46.9392) radius 0.889
  circle A13 centre (-25.4, 20.955) radius 2.54
  circle A14 centre (-25.4, 33.1527) radius 1.7272
  dimension "d104" = 3.4544
extrude "Extrusion13" add sketch "Sketch17" along normal blind 3
sketch "Sketch18" plane through (0, 33.1527, -25.4) normal (-1, 0, 0) x (0, 0, 1)
  circle A0 centre (0, 0) radius 1.7272
  circle A1 centre (0, 0) radius 1.7272
  point P0 (25.4, -33.1527)
extrude "Extrusion14" cut sketch "Sketch18" against normal up to surface (10.2616 mm away)
sketch "Sketch20" plane through (10.2616, 0, 0) normal (1, 0, 0) x (0, 0, -1)
  circle A0 centre (25.4, 33.1527) radius 1.7272
  circle A1 centre (25.4, -6.096) radius 2.2225
  line L0 (0, 0) -> (0, 50.8)
  line L1 (50.8, 0) -> (0, 0)
  line L2 (3.175, 0) -> (47.625, 0)
  line L3 (47.625, 0) -> (47.625, -30.48)
  line L4 (47.625, -30.48) -> (3.175, -30.48)
  line L5 (3.175, -30.48) -> (3.175, 0)
  dimension "d111" = 4.445
  dimension "d114" = 0
  dimension "d117" = 6.096
  dimension "d118" = 44.45
  dimension "d119" = 30.48
  dimension "d120" = 3.175
extrude "Extrusion16" add sketch "Sketch20" against normal up to surface (13.2616 mm away) contours L3 L4 L5 L1
sketch "Sketch21" plane through (10.2616, 0, 0) normal (1, 0, 0) x (0, 0, -1)
  line L0 (22.86, 55.5625) -> (22.86, 71.4375)
  arc A0 (27.94, 71.4375) -> (22.86, 71.4375) centre (25.4, 71.4375) ccw
  line L1 (27.94, 71.4375) -> (27.94, 55.5625)
  arc A1 (22.86, 55.5625) -> (27.94, 55.5625) centre (25.4, 55.5625) ccw
  line L2 (15.875, 50.8) -> (34.925, 50.8)
  line L3 (34.925, 50.8) -> (34.925, 76.2)
  line L4 (34.925, 76.2) -> (15.875, 76.2)
  line L5 (15.875, 76.2) -> (15.875, 50.8)
extrude "Extrusion17" cut sketch "Sketch21" against normal up to surface (13.2616 mm away)
sketch "Sketch22" plane through (0, 9.3707, -34.8292) normal (-1, 0, 0) x (0, 0, 1)
  circle A0 centre (0, 0) radius 1.27
  circle A1 centre (0, 0) radius 1.27
  point P0 (34.8292, -9.3707)
extrude "Extrusion18" add sketch "Sketch22" along normal up to surface (3 mm away)
sketch "Sketch23" plane through (10.2616, 0, 0) normal (1, 0, 0) x (0, 0, -1)
  line L0 (47.625, -30.48) -> (3.175, -30.48)
  circle A0 centre (25.4, -24.13) radius 1.7272
  dimension "d127" = 3.4544
  dimension "d128" = 6.35
extrude "Extrusion19" cut sketch "Sketch23" against normal up to next
sketch "Sketch24" plane through (-3, 0, 0) normal (-1, 0, 0) x (0, 0, 1)
  circle A0 centre (-25.4, -6.096) radius 2.2225
  circle A1 centre (-25.4, -6.096) radius 3.425
  point P0 (0, 0)
  dimension "d131" = 6.85
extrude "Extrusion20" cut sketch "Sketch24" against normal blind 4.2
thicken "Thicken1" operation add thickness 0.175 both sides no extend neighbours yes toward (0, -0.0804666, 0.9967573) faces at (-0.2, -6.3716, -21.9861)
sketch "Sketch26" plane through (6.35, 20.955, -25.4) normal (-1, 0, 0) x (0, 0, 1)
  circle A0 centre (0, 0) radius 1.1303
  circle A1 centre (0, 0) radius 1.27
  point P0 (25.4, -20.955)
  dimension "d159" = 2.2606
extrude "Extrusion23" add sketch "Sketch26" against normal blind 3.912
sketch "Sketch27" plane through (10.2616, 0, 0) normal (1, 0, 0) x (0, 0, -1)
  circle A0 centre (25.4, 46.9392) radius 0.889
  circle A1 centre (25.4, 46.9392) radius 1.1303
  circle A2 centre (33.6553, 5.4225) radius 0.889
  circle A3 centre (33.6553, 5.4225) radius 1.1303
  point P0 (0, 0)
  dimension "d162" = 2.2606
  dimension "d163" = 2.2606
extrude "Extrusion24" cut sketch "Sketch27" against normal blind 10 contours A0 | A1 | A2 | A3
sketch "Sketch28" plane through (-3, 0, 0) normal (-1, 0, 0) x (0, 0, 1)
  circle A0 centre (-33.6553, 5.4225) radius 1.1303
  circle A1 centre (-33.6553, 5.4225) radius 2.325
  circle A2 centre (-25.4, 46.9392) radius 0.889
  circle A3 centre (-25.4, 46.9392) radius 2.325
  point P0 (0, 0)
  dimension "d166" = 4.65
  dimension "d167" = 4.65
extrude "Extrusion25" cut sketch "Sketch28" against normal blind 3.5
sketch "Sketch29" plane through (-3, 0, 0) normal (-1, 0, 0) x (0, 0, 1)
  circle A0 centre (-33.6553, 5.4225) radius 0.889
  circle A1 centre (-33.6553, 5.4225) radius 1.1303
  circle A2 centre (-25.4, 46.9392) radius 1.1303
  circle A3 centre (-25.4, 46.9392) radius 1.1303
  point P0 (0, 0)
  dimension "d170" = 2.2606
  dimension "d171" = 2.2606
extrude "Extrusion26" cut sketch "Sketch29" against normal blind 10 contours A0 | A1 | A2
properties part number "mounting base"
